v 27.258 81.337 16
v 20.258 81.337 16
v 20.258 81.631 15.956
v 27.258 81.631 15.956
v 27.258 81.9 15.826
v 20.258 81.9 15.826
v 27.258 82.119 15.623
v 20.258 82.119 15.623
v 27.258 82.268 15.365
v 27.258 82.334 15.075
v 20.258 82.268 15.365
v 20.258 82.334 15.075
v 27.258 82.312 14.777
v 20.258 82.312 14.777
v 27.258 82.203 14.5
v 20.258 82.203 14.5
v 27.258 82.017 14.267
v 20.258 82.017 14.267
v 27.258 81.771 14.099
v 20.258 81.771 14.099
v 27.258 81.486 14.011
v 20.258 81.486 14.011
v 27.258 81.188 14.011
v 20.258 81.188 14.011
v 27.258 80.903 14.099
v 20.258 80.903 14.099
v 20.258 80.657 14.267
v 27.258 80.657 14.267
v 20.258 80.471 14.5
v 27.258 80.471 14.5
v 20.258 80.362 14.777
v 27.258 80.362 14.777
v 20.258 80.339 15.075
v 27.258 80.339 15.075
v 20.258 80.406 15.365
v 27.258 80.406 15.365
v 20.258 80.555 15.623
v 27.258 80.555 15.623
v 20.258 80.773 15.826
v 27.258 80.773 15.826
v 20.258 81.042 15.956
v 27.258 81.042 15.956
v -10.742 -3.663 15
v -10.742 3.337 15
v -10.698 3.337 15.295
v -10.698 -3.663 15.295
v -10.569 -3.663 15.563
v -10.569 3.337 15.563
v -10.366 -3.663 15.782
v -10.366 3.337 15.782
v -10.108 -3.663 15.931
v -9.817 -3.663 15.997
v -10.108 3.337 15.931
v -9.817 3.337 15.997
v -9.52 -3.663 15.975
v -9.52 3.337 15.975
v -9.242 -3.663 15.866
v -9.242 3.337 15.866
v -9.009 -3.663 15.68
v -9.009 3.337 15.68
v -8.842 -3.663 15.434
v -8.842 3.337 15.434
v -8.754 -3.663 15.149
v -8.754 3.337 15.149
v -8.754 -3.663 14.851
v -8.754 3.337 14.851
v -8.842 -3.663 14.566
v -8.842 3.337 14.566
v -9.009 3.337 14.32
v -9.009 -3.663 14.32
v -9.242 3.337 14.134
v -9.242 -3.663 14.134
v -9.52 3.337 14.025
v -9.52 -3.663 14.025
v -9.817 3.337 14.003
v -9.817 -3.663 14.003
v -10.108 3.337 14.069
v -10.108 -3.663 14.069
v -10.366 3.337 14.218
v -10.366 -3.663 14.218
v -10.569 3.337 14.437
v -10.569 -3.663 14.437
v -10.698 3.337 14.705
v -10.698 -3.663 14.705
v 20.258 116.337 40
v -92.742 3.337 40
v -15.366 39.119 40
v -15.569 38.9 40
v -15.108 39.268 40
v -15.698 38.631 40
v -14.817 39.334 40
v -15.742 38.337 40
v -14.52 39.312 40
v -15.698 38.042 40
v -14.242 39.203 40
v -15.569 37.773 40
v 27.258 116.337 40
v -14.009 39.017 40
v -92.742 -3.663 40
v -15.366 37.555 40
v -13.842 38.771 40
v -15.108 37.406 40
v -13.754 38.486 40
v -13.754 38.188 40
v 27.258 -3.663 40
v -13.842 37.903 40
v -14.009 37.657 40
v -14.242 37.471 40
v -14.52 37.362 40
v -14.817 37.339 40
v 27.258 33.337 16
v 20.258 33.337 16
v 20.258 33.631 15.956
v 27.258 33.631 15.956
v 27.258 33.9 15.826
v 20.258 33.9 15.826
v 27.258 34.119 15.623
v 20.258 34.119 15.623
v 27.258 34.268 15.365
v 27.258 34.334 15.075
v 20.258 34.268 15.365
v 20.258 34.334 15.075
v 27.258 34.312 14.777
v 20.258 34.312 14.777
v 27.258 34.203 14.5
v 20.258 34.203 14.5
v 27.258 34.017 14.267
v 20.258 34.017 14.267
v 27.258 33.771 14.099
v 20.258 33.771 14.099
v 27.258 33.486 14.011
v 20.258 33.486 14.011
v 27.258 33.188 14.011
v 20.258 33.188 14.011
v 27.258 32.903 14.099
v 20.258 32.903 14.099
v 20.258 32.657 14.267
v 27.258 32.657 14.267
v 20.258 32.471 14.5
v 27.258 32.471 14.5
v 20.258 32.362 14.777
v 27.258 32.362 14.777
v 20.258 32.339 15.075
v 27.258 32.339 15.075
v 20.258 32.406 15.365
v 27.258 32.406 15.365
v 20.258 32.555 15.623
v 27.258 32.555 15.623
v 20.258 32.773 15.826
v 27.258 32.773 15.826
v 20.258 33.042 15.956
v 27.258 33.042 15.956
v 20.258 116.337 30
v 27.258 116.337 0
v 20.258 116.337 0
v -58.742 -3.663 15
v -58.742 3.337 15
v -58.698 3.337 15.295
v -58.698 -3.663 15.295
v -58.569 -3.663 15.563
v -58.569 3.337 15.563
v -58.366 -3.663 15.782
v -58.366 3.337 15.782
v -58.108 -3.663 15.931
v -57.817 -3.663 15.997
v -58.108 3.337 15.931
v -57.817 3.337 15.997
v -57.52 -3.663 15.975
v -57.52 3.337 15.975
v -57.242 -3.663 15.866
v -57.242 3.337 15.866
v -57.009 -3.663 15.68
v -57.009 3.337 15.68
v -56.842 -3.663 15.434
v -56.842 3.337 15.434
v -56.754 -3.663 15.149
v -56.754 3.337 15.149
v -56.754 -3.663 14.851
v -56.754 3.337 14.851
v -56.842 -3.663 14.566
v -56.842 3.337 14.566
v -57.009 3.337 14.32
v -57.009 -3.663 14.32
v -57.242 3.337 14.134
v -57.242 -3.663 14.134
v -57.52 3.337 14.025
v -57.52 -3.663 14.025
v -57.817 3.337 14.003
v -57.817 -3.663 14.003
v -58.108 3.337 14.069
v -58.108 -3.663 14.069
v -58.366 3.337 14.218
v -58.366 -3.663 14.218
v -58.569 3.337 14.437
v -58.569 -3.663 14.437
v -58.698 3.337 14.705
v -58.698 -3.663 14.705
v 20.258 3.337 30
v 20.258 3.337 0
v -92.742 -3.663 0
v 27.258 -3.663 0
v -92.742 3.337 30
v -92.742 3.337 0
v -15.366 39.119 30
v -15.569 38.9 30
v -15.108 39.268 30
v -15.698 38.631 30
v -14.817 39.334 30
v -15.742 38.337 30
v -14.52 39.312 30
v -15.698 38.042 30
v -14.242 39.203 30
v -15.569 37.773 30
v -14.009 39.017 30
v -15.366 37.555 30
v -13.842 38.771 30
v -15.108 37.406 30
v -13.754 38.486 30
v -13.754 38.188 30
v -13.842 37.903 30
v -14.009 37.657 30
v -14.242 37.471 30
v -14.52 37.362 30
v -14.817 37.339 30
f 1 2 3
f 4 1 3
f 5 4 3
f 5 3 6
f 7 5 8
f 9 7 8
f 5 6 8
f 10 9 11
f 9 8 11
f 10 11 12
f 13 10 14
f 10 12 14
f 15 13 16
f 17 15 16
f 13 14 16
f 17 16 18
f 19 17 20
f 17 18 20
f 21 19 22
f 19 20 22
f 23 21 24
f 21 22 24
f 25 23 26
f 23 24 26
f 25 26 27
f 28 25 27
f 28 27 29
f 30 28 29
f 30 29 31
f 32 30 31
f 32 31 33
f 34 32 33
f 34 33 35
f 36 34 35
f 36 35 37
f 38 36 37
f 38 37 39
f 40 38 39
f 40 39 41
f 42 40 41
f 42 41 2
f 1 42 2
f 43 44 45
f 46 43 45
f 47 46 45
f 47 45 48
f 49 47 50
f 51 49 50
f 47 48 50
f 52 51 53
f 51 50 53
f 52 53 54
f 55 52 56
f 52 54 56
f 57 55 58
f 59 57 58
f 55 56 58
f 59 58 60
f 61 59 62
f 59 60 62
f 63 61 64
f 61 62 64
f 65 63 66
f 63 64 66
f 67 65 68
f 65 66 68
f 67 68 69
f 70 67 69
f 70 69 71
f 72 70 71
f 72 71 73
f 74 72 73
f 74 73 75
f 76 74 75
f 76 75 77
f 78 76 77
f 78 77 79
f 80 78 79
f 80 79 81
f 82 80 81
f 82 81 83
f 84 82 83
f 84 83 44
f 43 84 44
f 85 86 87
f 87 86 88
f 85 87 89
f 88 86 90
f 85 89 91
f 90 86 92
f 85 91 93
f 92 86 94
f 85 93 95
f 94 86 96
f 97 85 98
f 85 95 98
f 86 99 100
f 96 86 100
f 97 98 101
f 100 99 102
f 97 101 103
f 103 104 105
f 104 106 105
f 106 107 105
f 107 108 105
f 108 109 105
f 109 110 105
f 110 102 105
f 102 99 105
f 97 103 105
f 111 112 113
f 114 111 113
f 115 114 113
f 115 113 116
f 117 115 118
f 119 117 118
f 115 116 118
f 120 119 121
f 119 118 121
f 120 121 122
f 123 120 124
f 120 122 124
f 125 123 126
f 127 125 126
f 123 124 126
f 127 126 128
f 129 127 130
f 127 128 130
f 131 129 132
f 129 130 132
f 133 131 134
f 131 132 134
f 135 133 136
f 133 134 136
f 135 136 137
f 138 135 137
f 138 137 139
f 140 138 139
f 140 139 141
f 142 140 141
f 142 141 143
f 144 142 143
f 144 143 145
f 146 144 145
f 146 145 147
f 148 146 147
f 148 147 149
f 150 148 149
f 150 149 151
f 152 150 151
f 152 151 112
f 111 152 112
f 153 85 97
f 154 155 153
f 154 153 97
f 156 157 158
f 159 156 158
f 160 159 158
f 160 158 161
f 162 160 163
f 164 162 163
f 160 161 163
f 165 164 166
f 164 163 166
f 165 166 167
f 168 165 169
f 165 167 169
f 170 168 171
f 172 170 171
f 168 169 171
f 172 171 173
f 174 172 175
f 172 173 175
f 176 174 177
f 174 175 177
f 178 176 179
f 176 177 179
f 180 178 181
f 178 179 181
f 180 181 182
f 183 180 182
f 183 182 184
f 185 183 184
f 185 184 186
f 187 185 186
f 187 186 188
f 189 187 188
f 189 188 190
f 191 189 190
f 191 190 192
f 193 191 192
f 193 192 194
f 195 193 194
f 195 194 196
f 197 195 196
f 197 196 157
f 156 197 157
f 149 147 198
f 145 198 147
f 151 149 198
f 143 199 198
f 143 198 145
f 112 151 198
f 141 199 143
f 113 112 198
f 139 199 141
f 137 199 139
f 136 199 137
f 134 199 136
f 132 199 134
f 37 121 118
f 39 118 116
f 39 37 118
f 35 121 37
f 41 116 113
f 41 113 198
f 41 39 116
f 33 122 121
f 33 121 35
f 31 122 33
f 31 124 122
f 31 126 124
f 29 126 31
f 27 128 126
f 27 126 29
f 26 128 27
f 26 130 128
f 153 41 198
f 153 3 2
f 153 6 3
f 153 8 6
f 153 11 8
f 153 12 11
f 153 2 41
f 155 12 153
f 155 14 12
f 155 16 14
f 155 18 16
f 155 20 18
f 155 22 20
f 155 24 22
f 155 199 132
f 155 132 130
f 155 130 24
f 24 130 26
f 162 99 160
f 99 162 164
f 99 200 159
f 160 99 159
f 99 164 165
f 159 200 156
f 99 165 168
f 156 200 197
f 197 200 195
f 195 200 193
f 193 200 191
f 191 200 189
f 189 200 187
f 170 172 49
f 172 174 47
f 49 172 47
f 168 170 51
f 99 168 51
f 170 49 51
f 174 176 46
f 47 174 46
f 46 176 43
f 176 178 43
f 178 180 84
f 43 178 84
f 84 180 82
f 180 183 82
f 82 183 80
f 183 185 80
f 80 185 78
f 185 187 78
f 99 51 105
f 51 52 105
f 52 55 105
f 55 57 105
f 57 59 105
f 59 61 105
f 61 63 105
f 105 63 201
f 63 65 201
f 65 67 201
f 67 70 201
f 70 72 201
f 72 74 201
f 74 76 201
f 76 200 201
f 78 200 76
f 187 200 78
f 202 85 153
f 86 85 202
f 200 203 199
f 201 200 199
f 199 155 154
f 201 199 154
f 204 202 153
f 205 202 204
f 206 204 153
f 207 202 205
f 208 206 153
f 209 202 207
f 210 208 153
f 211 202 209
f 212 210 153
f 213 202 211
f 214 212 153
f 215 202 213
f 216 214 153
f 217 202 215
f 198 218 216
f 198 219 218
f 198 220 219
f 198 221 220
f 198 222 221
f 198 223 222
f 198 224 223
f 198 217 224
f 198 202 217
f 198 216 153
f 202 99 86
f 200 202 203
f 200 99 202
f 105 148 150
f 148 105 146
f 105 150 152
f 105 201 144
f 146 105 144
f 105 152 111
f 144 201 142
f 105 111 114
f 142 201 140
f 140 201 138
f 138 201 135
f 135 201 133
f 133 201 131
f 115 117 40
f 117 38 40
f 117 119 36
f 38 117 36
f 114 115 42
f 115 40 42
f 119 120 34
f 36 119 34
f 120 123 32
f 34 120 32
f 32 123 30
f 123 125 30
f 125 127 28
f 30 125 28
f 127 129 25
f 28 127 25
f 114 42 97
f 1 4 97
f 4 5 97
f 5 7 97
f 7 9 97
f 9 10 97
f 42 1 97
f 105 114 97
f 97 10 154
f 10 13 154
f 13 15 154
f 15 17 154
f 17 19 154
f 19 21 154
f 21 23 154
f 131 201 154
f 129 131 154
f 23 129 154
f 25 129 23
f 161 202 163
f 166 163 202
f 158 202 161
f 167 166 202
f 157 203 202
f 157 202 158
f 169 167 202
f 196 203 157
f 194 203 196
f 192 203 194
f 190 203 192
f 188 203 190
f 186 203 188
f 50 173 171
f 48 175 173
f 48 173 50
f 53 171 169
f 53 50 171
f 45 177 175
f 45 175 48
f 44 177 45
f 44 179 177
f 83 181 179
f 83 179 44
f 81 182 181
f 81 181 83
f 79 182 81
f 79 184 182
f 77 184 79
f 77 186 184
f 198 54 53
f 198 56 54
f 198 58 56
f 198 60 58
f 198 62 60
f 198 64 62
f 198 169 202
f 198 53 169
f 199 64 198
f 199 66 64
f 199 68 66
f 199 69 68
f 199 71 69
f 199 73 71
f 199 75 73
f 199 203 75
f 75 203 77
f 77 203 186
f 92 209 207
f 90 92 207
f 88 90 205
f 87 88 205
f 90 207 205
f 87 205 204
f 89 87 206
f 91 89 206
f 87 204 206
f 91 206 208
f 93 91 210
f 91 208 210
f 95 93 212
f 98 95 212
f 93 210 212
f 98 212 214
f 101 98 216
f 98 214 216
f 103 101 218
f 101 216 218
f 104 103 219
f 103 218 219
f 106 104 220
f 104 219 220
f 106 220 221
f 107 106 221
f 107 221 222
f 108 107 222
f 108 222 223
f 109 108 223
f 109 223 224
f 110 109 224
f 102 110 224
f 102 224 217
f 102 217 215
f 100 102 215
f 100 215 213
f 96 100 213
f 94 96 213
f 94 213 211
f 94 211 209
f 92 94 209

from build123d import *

# Parameters (mm, degrees)
ESQUISSE1_W             = 7
ESQUISSE1_H             = 113
ESQUISSE1_W_2           = 120
ESQUISSE1_H_2           = 7
BOSS_EXTRU_2_DEPTH      = 40
ESQUISSE4_W             = 113
ESQUISSE4_H             = 10
BOSS_EXTRU_8_DEPTH      = 115
ENL_V_MAT_EXTRU_2_DEPTH = 115
ESQUISSE2_R             = 1
ENL_V_MAT_EXTRU_4_DEPTH = 115
ESQUISSE7_R             = 1
ENL_V_MAT_EXTRU_5_DEPTH = 115
ESQUISSE8_R             = 1
ENL_V_MAT_EXTRU_6_DEPTH = 115
ESQUISSE9_R             = 1
ENL_V_MAT_EXTRU_7_DEPTH = 115
ESQUISSE10_R            = 1
ENL_V_MAT_EXTRU_8_DEPTH = 20


with BuildPart() as part:
    # Esquisse1 → Boss.-Extru.2 (new body)
    with BuildSketch(Plane.XY):
        with Locations((23.75751598, 59.836675468)):
            Rectangle(ESQUISSE1_W, ESQUISSE1_H)
        with Locations((-32.74248402, -0.163324532)):
            Rectangle(ESQUISSE1_W_2, ESQUISSE1_H_2)
    extrude(amount=BOSS_EXTRU_2_DEPTH)

    # Esquisse4 → Boss.-Extru.8 (add)
    with BuildSketch(Plane(origin=(0, 3.336675468, 0), x_dir=(1, 0, 0), z_dir=(0, 1, 0))):
        with Locations((-36.24248402, -35)):
            Rectangle(ESQUISSE4_W, ESQUISSE4_H)
    extrude(amount=BOSS_EXTRU_8_DEPTH)

    # Esquisse6 → Enlèv. mat.-Extru.2 (cut)
    with BuildSketch(Plane.XY.offset(40)):
        Polygon((20.25751598, 116.336675468), (-92.74248402, 3.336675468), (-92.74248402, 118.336675468), (20.25751598, 118.336675468), align=None)
    extrude(amount=-ENL_V_MAT_EXTRU_2_DEPTH, mode=Mode.SUBTRACT)

    # Esquisse2 → Enlèv. mat.-Extru.4 (cut)
    with BuildSketch(Plane(origin=(0, 3.336675468, 0), x_dir=(1, 0, 0), z_dir=(0, 1, 0))):
        with Locations(Location((-57.74248402, -15, 0), (0, 0, 180))):  # turned: the seam where the file's is
            Circle(ESQUISSE2_R)
    extrude(amount=-ENL_V_MAT_EXTRU_4_DEPTH, mode=Mode.SUBTRACT)

    # Esquisse7 → Enlèv. mat.-Extru.5 (cut)
    with BuildSketch(Plane(origin=(0, 3.336675468, 0), x_dir=(1, 0, 0), z_dir=(0, 1, 0))):
        with Locations(Location((-9.74248402, -15, 0), (0, 0, 180))):  # turned: the seam where the file's is
            Circle(ESQUISSE7_R)
    extrude(amount=-ENL_V_MAT_EXTRU_5_DEPTH, mode=Mode.SUBTRACT)

    # Esquisse8 → Enlèv. mat.-Extru.6 (cut)
    with BuildSketch(Plane.ZY.offset(-20.25751598)):
        with Locations((15, 81.336675468)):
            Circle(ESQUISSE8_R)
    extrude(amount=-ENL_V_MAT_EXTRU_6_DEPTH, mode=Mode.SUBTRACT)

    # Esquisse9 → Enlèv. mat.-Extru.7 (cut)
    with BuildSketch(Plane.ZY.offset(-20.25751598)):
        with Locations((15, 33.336675468)):
            Circle(ESQUISSE9_R)
    extrude(amount=-ENL_V_MAT_EXTRU_7_DEPTH, mode=Mode.SUBTRACT)

    # Esquisse10 → Enlèv. mat.-Extru.8 (cut)
    with BuildSketch(Plane(origin=(0, 0, 30), x_dir=(-1, 0, 0), z_dir=(0, 0, -1))):
        with Locations((14.74248402, 38.336675468)):
            Circle(ESQUISSE10_R)
    extrude(amount=-ENL_V_MAT_EXTRU_8_DEPTH, mode=Mode.SUBTRACT)


solid = part.part
